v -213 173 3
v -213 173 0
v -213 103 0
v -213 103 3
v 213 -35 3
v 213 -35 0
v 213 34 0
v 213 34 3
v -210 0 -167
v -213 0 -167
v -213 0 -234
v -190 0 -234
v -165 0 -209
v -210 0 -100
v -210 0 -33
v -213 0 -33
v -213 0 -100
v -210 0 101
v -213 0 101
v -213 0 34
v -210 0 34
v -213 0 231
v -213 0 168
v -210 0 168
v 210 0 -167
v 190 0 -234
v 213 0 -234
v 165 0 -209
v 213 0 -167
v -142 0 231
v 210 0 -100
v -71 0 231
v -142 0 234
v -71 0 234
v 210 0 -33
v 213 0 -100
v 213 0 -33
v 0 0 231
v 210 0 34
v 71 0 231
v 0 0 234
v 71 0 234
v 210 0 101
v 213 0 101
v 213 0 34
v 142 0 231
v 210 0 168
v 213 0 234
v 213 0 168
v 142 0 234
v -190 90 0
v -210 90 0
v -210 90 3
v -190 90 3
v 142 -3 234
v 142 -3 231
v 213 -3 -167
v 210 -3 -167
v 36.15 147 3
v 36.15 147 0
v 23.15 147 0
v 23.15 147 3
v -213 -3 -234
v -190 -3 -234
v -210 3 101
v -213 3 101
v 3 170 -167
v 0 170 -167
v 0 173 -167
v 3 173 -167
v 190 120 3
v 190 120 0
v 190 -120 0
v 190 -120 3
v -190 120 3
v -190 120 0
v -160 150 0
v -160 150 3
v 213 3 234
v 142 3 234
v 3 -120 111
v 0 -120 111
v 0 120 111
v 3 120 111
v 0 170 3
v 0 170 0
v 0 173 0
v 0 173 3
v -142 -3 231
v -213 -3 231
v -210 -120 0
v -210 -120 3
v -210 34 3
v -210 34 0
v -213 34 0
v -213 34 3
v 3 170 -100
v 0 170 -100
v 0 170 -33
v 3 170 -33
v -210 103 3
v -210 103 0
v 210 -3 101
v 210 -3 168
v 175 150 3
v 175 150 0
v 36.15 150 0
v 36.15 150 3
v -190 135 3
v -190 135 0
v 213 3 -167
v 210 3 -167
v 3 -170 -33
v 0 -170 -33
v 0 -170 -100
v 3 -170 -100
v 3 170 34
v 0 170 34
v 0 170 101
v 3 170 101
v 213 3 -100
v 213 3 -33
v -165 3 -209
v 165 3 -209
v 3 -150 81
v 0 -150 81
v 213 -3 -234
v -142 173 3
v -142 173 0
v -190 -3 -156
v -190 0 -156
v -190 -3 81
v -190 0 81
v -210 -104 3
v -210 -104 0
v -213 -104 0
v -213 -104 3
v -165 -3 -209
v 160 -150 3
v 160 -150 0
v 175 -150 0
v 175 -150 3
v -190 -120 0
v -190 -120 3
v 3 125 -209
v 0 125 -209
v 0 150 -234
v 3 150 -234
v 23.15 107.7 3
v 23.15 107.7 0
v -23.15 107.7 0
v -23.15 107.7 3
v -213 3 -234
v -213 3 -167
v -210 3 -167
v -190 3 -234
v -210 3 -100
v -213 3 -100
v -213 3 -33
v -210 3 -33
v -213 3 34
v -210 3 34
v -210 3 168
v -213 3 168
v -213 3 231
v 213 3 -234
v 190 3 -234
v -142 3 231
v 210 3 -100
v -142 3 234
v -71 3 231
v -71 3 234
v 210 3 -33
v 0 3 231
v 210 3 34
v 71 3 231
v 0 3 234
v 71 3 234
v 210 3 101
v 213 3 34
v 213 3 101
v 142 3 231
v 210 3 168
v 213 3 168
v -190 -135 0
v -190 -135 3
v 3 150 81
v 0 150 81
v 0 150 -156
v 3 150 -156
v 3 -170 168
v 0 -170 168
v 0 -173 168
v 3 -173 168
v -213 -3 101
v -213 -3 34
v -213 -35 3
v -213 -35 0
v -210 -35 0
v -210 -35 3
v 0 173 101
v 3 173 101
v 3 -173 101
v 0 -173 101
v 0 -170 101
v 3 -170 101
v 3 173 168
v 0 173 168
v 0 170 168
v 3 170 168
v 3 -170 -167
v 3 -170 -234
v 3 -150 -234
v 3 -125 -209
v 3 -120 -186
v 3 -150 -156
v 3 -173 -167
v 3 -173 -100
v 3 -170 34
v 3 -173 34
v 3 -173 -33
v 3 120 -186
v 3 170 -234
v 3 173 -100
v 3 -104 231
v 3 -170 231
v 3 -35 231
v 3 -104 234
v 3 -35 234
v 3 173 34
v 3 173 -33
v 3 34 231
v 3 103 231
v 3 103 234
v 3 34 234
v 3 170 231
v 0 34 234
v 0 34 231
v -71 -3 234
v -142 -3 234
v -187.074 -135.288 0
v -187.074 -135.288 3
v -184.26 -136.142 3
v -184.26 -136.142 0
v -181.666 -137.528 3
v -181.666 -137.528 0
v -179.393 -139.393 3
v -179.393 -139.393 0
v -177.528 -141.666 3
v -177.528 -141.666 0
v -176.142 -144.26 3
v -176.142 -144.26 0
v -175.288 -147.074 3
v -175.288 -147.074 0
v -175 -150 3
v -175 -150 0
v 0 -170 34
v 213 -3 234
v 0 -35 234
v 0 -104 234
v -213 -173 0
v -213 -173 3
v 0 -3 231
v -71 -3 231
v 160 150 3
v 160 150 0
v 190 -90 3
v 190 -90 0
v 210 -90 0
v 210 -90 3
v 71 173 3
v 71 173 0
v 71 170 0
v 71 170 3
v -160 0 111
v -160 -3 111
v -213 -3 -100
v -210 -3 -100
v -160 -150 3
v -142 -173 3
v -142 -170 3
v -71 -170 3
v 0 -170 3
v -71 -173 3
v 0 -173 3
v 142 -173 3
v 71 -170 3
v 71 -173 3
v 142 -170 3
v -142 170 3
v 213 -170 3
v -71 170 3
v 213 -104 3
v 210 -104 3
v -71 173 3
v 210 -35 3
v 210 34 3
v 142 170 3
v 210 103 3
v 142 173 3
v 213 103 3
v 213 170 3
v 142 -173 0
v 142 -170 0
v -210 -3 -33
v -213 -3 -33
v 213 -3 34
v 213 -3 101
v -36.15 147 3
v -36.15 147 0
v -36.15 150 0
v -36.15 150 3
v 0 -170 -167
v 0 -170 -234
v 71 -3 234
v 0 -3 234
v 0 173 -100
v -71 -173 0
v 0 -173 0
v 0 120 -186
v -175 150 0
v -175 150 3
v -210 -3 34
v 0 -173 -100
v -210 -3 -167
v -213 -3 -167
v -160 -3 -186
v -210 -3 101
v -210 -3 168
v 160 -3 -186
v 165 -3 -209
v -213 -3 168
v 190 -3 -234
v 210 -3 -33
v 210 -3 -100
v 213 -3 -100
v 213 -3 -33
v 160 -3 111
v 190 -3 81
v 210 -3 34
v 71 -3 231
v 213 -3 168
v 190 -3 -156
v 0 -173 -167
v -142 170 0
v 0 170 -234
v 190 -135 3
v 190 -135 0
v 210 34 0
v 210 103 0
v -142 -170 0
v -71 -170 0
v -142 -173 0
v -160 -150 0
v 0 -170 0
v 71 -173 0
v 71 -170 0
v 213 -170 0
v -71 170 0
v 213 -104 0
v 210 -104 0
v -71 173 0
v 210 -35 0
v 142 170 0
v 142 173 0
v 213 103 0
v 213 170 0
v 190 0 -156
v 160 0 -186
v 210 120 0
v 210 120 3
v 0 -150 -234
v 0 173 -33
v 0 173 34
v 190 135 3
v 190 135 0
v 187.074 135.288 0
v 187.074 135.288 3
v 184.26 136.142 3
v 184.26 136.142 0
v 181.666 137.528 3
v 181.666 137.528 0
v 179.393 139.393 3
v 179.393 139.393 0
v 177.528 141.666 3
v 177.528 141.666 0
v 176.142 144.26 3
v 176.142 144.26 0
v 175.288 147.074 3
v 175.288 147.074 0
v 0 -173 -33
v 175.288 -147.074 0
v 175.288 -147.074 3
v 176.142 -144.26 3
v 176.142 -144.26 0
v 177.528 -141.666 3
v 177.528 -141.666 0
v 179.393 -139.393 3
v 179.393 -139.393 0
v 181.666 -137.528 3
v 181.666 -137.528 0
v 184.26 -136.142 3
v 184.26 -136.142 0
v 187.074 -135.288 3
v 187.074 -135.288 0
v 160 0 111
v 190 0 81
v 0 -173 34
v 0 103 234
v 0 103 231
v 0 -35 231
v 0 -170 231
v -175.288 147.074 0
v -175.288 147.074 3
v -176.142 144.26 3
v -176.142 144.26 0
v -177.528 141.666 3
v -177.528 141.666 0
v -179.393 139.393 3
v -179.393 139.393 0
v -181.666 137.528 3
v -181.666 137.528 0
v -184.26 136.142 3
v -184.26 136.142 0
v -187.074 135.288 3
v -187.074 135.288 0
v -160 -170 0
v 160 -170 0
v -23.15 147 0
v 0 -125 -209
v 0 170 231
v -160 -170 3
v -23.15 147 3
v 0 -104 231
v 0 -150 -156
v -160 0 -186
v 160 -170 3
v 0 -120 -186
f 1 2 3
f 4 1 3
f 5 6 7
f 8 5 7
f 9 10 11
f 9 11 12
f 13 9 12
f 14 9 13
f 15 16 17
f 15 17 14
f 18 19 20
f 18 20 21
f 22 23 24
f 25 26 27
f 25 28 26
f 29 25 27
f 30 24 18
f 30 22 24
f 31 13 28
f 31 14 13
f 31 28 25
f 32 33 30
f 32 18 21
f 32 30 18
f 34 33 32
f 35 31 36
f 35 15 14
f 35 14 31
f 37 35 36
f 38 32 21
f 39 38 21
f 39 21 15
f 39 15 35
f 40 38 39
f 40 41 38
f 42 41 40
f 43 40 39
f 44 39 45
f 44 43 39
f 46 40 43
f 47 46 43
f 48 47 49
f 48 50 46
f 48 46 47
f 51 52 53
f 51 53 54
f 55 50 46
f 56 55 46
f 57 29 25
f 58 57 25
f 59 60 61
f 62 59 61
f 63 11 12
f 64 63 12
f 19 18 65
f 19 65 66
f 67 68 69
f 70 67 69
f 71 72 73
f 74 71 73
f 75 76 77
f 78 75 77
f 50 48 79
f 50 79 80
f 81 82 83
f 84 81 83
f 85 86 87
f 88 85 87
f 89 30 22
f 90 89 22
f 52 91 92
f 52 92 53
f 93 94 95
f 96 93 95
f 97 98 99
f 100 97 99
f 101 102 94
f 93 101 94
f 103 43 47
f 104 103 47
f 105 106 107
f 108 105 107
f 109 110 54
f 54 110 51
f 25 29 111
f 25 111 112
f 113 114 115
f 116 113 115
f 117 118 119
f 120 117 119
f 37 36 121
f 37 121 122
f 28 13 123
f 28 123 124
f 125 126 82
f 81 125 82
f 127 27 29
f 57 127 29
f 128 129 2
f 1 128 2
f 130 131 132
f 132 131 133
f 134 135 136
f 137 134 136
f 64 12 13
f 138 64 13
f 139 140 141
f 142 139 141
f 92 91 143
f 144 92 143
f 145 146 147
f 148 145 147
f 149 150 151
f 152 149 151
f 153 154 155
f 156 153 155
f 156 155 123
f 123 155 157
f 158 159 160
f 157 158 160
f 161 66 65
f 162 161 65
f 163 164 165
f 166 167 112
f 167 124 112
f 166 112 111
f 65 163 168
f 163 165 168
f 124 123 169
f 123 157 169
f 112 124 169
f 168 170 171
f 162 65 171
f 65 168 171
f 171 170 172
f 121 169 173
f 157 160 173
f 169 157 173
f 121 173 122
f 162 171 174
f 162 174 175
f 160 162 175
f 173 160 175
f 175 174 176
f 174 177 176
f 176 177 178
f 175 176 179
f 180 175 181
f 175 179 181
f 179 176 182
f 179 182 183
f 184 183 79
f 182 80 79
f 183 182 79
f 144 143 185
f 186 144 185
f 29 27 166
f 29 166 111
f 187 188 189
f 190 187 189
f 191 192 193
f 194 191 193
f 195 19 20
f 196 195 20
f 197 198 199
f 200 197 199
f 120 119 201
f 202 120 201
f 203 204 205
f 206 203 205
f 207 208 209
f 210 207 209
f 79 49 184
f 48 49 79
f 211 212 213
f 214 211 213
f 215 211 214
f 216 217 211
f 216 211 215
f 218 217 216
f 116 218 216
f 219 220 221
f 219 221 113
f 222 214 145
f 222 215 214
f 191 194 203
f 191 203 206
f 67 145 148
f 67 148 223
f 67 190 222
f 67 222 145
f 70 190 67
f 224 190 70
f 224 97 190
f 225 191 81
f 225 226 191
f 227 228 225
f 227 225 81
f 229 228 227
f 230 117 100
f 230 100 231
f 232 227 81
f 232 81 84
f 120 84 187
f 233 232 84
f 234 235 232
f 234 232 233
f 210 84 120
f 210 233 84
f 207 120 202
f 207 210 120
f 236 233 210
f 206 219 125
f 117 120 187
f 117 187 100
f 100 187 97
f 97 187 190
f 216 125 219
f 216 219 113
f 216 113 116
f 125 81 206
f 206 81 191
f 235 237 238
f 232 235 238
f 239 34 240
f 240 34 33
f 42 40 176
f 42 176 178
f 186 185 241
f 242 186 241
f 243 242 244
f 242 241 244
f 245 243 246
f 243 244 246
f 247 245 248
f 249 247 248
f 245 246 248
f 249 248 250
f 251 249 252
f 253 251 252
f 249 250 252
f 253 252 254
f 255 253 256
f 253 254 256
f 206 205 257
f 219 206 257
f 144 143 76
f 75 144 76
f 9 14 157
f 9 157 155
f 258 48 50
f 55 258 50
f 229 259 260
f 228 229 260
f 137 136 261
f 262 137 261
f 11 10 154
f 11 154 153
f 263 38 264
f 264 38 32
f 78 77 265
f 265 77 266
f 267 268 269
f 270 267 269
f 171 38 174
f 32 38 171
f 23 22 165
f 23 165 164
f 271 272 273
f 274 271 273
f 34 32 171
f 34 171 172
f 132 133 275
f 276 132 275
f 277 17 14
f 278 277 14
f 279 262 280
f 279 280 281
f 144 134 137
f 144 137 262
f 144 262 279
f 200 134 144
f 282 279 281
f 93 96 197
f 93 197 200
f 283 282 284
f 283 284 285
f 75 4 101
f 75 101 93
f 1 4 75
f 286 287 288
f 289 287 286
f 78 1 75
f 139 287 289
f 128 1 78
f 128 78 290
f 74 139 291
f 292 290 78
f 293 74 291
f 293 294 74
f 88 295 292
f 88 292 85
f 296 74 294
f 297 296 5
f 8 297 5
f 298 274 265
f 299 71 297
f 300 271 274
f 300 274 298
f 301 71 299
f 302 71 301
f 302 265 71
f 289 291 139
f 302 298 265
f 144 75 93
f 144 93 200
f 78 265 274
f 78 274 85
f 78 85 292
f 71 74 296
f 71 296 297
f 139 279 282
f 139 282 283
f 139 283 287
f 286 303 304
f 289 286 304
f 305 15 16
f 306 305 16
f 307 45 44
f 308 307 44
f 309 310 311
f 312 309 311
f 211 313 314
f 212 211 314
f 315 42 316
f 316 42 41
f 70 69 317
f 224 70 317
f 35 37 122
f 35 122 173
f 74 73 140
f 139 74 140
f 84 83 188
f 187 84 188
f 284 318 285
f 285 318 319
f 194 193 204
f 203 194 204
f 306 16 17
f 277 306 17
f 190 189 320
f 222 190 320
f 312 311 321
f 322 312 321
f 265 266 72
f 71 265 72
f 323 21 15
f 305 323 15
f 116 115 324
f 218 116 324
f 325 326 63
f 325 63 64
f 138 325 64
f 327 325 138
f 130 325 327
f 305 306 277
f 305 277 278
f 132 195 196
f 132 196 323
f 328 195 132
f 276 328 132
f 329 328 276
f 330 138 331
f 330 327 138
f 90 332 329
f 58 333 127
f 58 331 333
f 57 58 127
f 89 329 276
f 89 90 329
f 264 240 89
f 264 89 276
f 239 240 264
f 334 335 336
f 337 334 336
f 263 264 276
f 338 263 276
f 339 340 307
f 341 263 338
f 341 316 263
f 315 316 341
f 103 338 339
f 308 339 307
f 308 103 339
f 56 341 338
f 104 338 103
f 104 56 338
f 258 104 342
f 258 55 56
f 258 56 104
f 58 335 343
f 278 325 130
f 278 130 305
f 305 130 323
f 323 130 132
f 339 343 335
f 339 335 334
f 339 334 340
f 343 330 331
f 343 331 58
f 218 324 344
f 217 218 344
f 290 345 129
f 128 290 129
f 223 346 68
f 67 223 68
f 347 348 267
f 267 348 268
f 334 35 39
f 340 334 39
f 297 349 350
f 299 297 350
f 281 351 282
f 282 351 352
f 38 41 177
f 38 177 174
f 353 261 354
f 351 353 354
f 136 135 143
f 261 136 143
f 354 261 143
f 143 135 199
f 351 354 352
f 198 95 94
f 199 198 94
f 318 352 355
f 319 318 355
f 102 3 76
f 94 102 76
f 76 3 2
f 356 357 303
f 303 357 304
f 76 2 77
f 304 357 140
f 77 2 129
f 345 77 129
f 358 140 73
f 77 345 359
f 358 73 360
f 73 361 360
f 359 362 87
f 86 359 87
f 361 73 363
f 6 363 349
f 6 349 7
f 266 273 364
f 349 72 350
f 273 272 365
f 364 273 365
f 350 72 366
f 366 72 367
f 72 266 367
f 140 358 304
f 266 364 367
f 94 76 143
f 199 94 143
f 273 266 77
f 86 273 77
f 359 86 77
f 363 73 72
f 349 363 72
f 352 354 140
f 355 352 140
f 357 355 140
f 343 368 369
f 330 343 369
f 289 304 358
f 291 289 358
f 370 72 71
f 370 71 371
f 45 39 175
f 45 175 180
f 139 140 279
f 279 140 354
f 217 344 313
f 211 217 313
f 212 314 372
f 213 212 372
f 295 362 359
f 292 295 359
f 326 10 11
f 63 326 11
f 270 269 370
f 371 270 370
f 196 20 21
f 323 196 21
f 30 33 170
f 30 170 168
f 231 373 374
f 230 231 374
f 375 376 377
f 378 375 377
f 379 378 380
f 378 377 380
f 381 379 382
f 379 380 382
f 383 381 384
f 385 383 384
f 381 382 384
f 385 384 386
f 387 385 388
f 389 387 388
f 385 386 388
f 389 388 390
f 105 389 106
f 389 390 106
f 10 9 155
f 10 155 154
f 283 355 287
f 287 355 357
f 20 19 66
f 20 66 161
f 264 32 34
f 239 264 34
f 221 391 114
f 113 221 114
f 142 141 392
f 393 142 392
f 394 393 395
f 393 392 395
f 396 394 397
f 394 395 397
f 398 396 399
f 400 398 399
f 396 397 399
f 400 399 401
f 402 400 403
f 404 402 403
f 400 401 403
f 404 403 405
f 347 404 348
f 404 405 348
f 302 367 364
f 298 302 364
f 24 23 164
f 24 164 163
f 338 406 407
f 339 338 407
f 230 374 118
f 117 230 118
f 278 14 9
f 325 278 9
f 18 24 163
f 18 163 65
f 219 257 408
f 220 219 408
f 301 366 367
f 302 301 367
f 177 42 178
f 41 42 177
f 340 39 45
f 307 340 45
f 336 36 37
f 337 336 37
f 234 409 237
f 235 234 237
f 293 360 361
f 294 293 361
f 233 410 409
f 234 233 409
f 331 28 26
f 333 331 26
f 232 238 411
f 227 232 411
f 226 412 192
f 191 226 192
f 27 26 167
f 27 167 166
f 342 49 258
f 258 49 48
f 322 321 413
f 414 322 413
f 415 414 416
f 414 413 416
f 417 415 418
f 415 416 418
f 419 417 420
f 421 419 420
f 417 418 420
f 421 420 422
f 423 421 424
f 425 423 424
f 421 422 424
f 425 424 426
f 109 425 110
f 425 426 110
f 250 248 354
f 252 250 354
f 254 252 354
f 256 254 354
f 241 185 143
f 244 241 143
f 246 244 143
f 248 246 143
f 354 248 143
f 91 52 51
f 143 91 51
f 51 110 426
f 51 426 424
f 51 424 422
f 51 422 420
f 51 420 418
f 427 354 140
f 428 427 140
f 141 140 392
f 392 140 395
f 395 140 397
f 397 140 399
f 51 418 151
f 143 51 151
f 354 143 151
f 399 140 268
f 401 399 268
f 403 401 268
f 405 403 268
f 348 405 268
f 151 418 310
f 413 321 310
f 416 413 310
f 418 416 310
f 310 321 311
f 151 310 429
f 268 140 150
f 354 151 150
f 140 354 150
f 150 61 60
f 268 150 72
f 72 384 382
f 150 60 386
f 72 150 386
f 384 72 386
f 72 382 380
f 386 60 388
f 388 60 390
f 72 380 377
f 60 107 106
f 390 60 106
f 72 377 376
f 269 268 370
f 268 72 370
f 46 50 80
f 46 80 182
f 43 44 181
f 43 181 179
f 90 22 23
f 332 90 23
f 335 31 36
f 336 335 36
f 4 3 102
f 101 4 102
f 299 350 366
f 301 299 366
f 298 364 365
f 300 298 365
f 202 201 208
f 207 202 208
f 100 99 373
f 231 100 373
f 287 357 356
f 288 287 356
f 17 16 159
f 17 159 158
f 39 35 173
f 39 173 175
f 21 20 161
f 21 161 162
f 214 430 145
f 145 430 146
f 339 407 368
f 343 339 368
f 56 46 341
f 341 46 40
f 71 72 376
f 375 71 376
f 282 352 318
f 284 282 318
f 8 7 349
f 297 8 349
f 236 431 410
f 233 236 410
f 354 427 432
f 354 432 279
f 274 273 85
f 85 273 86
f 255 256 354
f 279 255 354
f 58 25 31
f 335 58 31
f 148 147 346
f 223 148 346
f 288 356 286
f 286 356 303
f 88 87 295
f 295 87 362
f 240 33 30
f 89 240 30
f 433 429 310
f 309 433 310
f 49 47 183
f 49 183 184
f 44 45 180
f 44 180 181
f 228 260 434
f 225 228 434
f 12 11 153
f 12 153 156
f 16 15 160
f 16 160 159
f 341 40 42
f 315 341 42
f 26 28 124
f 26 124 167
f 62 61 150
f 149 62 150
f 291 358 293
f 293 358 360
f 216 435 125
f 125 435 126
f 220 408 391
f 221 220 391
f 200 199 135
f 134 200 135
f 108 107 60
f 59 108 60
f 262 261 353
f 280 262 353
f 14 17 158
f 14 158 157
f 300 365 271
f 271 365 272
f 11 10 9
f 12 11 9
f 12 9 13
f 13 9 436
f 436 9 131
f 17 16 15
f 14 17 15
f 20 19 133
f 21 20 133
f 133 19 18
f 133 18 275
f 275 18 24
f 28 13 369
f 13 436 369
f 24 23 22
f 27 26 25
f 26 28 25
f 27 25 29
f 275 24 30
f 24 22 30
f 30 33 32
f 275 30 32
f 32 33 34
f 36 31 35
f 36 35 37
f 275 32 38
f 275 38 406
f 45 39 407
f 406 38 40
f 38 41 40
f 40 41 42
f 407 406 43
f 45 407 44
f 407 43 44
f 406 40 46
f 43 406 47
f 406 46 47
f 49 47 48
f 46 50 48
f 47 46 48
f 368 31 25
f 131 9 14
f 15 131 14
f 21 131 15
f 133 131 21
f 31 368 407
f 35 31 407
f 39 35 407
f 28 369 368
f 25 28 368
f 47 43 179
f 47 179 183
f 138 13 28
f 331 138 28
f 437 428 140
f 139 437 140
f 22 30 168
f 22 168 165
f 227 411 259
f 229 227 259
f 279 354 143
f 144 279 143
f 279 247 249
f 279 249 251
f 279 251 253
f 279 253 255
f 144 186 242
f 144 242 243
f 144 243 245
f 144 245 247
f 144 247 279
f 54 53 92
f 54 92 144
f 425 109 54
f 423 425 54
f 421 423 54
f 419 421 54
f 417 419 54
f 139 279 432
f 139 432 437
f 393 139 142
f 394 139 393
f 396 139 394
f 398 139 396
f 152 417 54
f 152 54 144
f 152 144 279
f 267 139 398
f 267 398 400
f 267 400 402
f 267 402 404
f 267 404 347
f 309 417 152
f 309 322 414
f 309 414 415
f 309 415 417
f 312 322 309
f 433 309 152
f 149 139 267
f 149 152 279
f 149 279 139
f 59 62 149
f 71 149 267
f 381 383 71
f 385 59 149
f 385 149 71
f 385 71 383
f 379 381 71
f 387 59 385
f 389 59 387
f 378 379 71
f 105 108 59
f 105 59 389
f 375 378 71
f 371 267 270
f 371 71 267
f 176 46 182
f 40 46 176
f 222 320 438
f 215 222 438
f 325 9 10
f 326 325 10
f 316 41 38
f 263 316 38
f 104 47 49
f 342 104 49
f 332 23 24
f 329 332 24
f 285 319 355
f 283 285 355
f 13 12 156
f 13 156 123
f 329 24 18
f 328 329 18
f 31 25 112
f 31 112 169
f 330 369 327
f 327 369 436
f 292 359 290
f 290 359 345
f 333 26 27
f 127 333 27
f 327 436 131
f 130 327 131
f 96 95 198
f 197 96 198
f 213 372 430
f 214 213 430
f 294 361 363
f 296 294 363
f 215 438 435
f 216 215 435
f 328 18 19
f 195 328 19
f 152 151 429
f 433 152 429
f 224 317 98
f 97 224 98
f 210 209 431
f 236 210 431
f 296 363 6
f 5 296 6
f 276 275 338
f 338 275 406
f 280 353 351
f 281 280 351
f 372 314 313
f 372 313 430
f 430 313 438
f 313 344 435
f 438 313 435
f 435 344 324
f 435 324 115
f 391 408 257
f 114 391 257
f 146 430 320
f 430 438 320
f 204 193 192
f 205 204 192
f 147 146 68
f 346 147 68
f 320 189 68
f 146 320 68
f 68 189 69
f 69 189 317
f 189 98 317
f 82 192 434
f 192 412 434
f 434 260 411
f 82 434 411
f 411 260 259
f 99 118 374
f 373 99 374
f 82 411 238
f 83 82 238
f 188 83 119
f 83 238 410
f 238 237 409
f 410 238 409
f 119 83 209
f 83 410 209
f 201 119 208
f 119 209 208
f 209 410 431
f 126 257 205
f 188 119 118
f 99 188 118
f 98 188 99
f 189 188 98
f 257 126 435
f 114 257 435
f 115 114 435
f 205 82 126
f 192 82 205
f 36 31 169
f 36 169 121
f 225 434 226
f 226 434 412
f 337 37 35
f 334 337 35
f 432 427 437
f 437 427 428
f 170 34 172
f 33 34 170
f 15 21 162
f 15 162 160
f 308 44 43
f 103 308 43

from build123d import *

# Parameters (mm, degrees)
F2_DEPTH  = 3
F4_DEPTH  = 3
F6_DEPTH  = 3
F8_DEPTH  = 3
F9_W      = 20
F9_H      = 210
F9_W_2    = 320
F9_H_2    = 20
F10_DEPTH = 3


with BuildPart() as f2:
    # F1 (on Top) → F2 (new body)
    with BuildSketch(Plane.XY):
        Polygon((71, -173), (142, -173), (142, -170), (213, -170), (213, -104), (210, -104), (210, -35), (213, -35), (213, 34), (210, 34), (210, 103), (213, 103), (213, 170), (142, 170), (142, 173), (71, 173), (71, 170), (0, 170), (0, 173), (-71, 173), (-71, 170), (-142, 170), (-142, 173), (-213, 173), (-213, 103), (-210, 103), (-210, 34), (-213, 34), (-213, -35), (-210, -35), (-210, -104), (-213, -104), (-213, -173), (-142, -173), (-142, -170), (-71, -170), (-71, -173), (0, -173), (0, -170), (71, -170), align=None)
        Polygon((-190, 120), (-160, 150), (160, 150), (190, 120), (190, -120), (160, -150), (-160, -150), (-190, -120), align=None, mode=Mode.SUBTRACT)
    extrude(amount=F2_DEPTH)


with BuildPart() as f4:
    # F3 (on Front) → F4 (new body)
    with BuildSketch(Plane.XZ):
        Polygon((190, -234), (213, -234), (213, -167), (210, -167), (210, -100), (213, -100), (213, -33), (210, -33), (210, 34), (213, 34), (213, 101), (210, 101), (210, 168), (213, 168), (213, 234), (142, 234), (142, 231), (71, 231), (71, 234), (0, 234), (0, 231), (-71, 231), (-71, 234), (-142, 234), (-142, 231), (-213, 231), (-213, 168), (-210, 168), (-210, 101), (-213, 101), (-213, 34), (-210, 34), (-210, -33), (-213, -33), (-213, -100), (-210, -100), (-210, -167), (-213, -167), (-213, -234), (-190, -234), (-165, -209), (165, -209), align=None)
        Polygon((-190, 81), (-160, 111), (160, 111), (190, 81), (190, -156), (160, -186), (-160, -186), (-190, -156), align=None, mode=Mode.SUBTRACT)
    extrude(amount=F4_DEPTH)


with BuildPart() as f6:
    # F3 (on Front) → F6 (new body)
    with BuildSketch(Plane.XZ):
        Polygon((190, -234), (213, -234), (213, -167), (210, -167), (210, -100), (213, -100), (213, -33), (210, -33), (210, 34), (213, 34), (213, 101), (210, 101), (210, 168), (213, 168), (213, 234), (142, 234), (142, 231), (71, 231), (71, 234), (0, 234), (0, 231), (-71, 231), (-71, 234), (-142, 234), (-142, 231), (-213, 231), (-213, 168), (-210, 168), (-210, 101), (-213, 101), (-213, 34), (-210, 34), (-210, -33), (-213, -33), (-213, -100), (-210, -100), (-210, -167), (-213, -167), (-213, -234), (-190, -234), (-165, -209), (165, -209), align=None)
        Polygon((-190, 81), (-160, 111), (160, 111), (190, 81), (190, -156), (160, -186), (-160, -186), (-190, -156), align=None, mode=Mode.SUBTRACT)
        Polygon((160, 111), (-160, 111), (-190, 81), (-190, -156), (-160, -186), (160, -186), (190, -156), (190, 81), align=None)
    extrude(amount=-F6_DEPTH)


with BuildPart() as f8:
    # F7 (on Right) → F8 (new body)
    with BuildSketch(Plane.YZ):
        Polygon((-35, 234), (-104, 234), (-104, 231), (-170, 231), (-170, 168), (-173, 168), (-173, 101), (-170, 101), (-170, 34), (-173, 34), (-173, -33), (-170, -33), (-170, -100), (-173, -100), (-173, -167), (-170, -167), (-170, -234), (-150, -234), (-125, -209), (125, -209), (150, -234), (170, -234), (170, -167), (173, -167), (173, -100), (170, -100), (170, -33), (173, -33), (173, 34), (170, 34), (170, 101), (173, 101), (173, 168), (170, 168), (170, 231), (103, 231), (103, 234), (34, 234), (34, 231), (-35, 231), align=None)
        Polygon((-120, 111), (120, 111), (150, 81), (150, -156), (120, -186), (-120, -186), (-150, -156), (-150, 81), align=None, mode=Mode.SUBTRACT)
    extrude(amount=F8_DEPTH)


with BuildPart() as f10:
    # F9 (on Top) → F10 (new body)
    with BuildSketch(Plane.XY):
        with BuildLine():
            Line((160, -150), (175, -150))
            ThreePointArc((175, -150), (179.3933982822, -139.3933982822), (190, -135))
            Line((190, -135), (190, -90))
            Line((190, -90), (190, 120))
            Line((190, 120), (190, 135))
            ThreePointArc((190, 135), (179.3933982822, 139.3933982822), (175, 150))
            Line((175, 150), (36.15, 150))
            Line((36.15, 150), (36.15, 147))
            Line((36.15, 147), (23.15, 147))
            Line((23.15, 147), (23.15, 107.7))
            Line((23.15, 107.7), (-23.15, 107.7))
            Line((-23.15, 107.7), (-23.15, 147))
            Line((-23.15, 147), (-36.15, 147))
            Line((-36.15, 147), (-36.15, 150))
            Line((-36.15, 150), (-175, 150))
            ThreePointArc((-175, 150), (-179.3933982822, 139.3933982822), (-190, 135))
            Line((-190, 135), (-190, 90))
            Line((-190, 90), (-190, -120))
            Line((-190, -120), (-190, -135))
            ThreePointArc((-190, -135), (-179.3933982822, -139.3933982822), (-175, -150))
            Line((-175, -150), (-160, -150))
            Line((-160, -150), (160, -150))
        make_face()
        with Locations((-200, -15)):
            Rectangle(F9_W, F9_H)
        with Locations((200, 15)):
            Rectangle(F9_W, F9_H)
        with Locations((0, -160)):
            Rectangle(F9_W_2, F9_H_2)
    extrude(amount=F10_DEPTH)


solid = Compound([f2.part, f4.part, f6.part, f8.part, f10.part])
